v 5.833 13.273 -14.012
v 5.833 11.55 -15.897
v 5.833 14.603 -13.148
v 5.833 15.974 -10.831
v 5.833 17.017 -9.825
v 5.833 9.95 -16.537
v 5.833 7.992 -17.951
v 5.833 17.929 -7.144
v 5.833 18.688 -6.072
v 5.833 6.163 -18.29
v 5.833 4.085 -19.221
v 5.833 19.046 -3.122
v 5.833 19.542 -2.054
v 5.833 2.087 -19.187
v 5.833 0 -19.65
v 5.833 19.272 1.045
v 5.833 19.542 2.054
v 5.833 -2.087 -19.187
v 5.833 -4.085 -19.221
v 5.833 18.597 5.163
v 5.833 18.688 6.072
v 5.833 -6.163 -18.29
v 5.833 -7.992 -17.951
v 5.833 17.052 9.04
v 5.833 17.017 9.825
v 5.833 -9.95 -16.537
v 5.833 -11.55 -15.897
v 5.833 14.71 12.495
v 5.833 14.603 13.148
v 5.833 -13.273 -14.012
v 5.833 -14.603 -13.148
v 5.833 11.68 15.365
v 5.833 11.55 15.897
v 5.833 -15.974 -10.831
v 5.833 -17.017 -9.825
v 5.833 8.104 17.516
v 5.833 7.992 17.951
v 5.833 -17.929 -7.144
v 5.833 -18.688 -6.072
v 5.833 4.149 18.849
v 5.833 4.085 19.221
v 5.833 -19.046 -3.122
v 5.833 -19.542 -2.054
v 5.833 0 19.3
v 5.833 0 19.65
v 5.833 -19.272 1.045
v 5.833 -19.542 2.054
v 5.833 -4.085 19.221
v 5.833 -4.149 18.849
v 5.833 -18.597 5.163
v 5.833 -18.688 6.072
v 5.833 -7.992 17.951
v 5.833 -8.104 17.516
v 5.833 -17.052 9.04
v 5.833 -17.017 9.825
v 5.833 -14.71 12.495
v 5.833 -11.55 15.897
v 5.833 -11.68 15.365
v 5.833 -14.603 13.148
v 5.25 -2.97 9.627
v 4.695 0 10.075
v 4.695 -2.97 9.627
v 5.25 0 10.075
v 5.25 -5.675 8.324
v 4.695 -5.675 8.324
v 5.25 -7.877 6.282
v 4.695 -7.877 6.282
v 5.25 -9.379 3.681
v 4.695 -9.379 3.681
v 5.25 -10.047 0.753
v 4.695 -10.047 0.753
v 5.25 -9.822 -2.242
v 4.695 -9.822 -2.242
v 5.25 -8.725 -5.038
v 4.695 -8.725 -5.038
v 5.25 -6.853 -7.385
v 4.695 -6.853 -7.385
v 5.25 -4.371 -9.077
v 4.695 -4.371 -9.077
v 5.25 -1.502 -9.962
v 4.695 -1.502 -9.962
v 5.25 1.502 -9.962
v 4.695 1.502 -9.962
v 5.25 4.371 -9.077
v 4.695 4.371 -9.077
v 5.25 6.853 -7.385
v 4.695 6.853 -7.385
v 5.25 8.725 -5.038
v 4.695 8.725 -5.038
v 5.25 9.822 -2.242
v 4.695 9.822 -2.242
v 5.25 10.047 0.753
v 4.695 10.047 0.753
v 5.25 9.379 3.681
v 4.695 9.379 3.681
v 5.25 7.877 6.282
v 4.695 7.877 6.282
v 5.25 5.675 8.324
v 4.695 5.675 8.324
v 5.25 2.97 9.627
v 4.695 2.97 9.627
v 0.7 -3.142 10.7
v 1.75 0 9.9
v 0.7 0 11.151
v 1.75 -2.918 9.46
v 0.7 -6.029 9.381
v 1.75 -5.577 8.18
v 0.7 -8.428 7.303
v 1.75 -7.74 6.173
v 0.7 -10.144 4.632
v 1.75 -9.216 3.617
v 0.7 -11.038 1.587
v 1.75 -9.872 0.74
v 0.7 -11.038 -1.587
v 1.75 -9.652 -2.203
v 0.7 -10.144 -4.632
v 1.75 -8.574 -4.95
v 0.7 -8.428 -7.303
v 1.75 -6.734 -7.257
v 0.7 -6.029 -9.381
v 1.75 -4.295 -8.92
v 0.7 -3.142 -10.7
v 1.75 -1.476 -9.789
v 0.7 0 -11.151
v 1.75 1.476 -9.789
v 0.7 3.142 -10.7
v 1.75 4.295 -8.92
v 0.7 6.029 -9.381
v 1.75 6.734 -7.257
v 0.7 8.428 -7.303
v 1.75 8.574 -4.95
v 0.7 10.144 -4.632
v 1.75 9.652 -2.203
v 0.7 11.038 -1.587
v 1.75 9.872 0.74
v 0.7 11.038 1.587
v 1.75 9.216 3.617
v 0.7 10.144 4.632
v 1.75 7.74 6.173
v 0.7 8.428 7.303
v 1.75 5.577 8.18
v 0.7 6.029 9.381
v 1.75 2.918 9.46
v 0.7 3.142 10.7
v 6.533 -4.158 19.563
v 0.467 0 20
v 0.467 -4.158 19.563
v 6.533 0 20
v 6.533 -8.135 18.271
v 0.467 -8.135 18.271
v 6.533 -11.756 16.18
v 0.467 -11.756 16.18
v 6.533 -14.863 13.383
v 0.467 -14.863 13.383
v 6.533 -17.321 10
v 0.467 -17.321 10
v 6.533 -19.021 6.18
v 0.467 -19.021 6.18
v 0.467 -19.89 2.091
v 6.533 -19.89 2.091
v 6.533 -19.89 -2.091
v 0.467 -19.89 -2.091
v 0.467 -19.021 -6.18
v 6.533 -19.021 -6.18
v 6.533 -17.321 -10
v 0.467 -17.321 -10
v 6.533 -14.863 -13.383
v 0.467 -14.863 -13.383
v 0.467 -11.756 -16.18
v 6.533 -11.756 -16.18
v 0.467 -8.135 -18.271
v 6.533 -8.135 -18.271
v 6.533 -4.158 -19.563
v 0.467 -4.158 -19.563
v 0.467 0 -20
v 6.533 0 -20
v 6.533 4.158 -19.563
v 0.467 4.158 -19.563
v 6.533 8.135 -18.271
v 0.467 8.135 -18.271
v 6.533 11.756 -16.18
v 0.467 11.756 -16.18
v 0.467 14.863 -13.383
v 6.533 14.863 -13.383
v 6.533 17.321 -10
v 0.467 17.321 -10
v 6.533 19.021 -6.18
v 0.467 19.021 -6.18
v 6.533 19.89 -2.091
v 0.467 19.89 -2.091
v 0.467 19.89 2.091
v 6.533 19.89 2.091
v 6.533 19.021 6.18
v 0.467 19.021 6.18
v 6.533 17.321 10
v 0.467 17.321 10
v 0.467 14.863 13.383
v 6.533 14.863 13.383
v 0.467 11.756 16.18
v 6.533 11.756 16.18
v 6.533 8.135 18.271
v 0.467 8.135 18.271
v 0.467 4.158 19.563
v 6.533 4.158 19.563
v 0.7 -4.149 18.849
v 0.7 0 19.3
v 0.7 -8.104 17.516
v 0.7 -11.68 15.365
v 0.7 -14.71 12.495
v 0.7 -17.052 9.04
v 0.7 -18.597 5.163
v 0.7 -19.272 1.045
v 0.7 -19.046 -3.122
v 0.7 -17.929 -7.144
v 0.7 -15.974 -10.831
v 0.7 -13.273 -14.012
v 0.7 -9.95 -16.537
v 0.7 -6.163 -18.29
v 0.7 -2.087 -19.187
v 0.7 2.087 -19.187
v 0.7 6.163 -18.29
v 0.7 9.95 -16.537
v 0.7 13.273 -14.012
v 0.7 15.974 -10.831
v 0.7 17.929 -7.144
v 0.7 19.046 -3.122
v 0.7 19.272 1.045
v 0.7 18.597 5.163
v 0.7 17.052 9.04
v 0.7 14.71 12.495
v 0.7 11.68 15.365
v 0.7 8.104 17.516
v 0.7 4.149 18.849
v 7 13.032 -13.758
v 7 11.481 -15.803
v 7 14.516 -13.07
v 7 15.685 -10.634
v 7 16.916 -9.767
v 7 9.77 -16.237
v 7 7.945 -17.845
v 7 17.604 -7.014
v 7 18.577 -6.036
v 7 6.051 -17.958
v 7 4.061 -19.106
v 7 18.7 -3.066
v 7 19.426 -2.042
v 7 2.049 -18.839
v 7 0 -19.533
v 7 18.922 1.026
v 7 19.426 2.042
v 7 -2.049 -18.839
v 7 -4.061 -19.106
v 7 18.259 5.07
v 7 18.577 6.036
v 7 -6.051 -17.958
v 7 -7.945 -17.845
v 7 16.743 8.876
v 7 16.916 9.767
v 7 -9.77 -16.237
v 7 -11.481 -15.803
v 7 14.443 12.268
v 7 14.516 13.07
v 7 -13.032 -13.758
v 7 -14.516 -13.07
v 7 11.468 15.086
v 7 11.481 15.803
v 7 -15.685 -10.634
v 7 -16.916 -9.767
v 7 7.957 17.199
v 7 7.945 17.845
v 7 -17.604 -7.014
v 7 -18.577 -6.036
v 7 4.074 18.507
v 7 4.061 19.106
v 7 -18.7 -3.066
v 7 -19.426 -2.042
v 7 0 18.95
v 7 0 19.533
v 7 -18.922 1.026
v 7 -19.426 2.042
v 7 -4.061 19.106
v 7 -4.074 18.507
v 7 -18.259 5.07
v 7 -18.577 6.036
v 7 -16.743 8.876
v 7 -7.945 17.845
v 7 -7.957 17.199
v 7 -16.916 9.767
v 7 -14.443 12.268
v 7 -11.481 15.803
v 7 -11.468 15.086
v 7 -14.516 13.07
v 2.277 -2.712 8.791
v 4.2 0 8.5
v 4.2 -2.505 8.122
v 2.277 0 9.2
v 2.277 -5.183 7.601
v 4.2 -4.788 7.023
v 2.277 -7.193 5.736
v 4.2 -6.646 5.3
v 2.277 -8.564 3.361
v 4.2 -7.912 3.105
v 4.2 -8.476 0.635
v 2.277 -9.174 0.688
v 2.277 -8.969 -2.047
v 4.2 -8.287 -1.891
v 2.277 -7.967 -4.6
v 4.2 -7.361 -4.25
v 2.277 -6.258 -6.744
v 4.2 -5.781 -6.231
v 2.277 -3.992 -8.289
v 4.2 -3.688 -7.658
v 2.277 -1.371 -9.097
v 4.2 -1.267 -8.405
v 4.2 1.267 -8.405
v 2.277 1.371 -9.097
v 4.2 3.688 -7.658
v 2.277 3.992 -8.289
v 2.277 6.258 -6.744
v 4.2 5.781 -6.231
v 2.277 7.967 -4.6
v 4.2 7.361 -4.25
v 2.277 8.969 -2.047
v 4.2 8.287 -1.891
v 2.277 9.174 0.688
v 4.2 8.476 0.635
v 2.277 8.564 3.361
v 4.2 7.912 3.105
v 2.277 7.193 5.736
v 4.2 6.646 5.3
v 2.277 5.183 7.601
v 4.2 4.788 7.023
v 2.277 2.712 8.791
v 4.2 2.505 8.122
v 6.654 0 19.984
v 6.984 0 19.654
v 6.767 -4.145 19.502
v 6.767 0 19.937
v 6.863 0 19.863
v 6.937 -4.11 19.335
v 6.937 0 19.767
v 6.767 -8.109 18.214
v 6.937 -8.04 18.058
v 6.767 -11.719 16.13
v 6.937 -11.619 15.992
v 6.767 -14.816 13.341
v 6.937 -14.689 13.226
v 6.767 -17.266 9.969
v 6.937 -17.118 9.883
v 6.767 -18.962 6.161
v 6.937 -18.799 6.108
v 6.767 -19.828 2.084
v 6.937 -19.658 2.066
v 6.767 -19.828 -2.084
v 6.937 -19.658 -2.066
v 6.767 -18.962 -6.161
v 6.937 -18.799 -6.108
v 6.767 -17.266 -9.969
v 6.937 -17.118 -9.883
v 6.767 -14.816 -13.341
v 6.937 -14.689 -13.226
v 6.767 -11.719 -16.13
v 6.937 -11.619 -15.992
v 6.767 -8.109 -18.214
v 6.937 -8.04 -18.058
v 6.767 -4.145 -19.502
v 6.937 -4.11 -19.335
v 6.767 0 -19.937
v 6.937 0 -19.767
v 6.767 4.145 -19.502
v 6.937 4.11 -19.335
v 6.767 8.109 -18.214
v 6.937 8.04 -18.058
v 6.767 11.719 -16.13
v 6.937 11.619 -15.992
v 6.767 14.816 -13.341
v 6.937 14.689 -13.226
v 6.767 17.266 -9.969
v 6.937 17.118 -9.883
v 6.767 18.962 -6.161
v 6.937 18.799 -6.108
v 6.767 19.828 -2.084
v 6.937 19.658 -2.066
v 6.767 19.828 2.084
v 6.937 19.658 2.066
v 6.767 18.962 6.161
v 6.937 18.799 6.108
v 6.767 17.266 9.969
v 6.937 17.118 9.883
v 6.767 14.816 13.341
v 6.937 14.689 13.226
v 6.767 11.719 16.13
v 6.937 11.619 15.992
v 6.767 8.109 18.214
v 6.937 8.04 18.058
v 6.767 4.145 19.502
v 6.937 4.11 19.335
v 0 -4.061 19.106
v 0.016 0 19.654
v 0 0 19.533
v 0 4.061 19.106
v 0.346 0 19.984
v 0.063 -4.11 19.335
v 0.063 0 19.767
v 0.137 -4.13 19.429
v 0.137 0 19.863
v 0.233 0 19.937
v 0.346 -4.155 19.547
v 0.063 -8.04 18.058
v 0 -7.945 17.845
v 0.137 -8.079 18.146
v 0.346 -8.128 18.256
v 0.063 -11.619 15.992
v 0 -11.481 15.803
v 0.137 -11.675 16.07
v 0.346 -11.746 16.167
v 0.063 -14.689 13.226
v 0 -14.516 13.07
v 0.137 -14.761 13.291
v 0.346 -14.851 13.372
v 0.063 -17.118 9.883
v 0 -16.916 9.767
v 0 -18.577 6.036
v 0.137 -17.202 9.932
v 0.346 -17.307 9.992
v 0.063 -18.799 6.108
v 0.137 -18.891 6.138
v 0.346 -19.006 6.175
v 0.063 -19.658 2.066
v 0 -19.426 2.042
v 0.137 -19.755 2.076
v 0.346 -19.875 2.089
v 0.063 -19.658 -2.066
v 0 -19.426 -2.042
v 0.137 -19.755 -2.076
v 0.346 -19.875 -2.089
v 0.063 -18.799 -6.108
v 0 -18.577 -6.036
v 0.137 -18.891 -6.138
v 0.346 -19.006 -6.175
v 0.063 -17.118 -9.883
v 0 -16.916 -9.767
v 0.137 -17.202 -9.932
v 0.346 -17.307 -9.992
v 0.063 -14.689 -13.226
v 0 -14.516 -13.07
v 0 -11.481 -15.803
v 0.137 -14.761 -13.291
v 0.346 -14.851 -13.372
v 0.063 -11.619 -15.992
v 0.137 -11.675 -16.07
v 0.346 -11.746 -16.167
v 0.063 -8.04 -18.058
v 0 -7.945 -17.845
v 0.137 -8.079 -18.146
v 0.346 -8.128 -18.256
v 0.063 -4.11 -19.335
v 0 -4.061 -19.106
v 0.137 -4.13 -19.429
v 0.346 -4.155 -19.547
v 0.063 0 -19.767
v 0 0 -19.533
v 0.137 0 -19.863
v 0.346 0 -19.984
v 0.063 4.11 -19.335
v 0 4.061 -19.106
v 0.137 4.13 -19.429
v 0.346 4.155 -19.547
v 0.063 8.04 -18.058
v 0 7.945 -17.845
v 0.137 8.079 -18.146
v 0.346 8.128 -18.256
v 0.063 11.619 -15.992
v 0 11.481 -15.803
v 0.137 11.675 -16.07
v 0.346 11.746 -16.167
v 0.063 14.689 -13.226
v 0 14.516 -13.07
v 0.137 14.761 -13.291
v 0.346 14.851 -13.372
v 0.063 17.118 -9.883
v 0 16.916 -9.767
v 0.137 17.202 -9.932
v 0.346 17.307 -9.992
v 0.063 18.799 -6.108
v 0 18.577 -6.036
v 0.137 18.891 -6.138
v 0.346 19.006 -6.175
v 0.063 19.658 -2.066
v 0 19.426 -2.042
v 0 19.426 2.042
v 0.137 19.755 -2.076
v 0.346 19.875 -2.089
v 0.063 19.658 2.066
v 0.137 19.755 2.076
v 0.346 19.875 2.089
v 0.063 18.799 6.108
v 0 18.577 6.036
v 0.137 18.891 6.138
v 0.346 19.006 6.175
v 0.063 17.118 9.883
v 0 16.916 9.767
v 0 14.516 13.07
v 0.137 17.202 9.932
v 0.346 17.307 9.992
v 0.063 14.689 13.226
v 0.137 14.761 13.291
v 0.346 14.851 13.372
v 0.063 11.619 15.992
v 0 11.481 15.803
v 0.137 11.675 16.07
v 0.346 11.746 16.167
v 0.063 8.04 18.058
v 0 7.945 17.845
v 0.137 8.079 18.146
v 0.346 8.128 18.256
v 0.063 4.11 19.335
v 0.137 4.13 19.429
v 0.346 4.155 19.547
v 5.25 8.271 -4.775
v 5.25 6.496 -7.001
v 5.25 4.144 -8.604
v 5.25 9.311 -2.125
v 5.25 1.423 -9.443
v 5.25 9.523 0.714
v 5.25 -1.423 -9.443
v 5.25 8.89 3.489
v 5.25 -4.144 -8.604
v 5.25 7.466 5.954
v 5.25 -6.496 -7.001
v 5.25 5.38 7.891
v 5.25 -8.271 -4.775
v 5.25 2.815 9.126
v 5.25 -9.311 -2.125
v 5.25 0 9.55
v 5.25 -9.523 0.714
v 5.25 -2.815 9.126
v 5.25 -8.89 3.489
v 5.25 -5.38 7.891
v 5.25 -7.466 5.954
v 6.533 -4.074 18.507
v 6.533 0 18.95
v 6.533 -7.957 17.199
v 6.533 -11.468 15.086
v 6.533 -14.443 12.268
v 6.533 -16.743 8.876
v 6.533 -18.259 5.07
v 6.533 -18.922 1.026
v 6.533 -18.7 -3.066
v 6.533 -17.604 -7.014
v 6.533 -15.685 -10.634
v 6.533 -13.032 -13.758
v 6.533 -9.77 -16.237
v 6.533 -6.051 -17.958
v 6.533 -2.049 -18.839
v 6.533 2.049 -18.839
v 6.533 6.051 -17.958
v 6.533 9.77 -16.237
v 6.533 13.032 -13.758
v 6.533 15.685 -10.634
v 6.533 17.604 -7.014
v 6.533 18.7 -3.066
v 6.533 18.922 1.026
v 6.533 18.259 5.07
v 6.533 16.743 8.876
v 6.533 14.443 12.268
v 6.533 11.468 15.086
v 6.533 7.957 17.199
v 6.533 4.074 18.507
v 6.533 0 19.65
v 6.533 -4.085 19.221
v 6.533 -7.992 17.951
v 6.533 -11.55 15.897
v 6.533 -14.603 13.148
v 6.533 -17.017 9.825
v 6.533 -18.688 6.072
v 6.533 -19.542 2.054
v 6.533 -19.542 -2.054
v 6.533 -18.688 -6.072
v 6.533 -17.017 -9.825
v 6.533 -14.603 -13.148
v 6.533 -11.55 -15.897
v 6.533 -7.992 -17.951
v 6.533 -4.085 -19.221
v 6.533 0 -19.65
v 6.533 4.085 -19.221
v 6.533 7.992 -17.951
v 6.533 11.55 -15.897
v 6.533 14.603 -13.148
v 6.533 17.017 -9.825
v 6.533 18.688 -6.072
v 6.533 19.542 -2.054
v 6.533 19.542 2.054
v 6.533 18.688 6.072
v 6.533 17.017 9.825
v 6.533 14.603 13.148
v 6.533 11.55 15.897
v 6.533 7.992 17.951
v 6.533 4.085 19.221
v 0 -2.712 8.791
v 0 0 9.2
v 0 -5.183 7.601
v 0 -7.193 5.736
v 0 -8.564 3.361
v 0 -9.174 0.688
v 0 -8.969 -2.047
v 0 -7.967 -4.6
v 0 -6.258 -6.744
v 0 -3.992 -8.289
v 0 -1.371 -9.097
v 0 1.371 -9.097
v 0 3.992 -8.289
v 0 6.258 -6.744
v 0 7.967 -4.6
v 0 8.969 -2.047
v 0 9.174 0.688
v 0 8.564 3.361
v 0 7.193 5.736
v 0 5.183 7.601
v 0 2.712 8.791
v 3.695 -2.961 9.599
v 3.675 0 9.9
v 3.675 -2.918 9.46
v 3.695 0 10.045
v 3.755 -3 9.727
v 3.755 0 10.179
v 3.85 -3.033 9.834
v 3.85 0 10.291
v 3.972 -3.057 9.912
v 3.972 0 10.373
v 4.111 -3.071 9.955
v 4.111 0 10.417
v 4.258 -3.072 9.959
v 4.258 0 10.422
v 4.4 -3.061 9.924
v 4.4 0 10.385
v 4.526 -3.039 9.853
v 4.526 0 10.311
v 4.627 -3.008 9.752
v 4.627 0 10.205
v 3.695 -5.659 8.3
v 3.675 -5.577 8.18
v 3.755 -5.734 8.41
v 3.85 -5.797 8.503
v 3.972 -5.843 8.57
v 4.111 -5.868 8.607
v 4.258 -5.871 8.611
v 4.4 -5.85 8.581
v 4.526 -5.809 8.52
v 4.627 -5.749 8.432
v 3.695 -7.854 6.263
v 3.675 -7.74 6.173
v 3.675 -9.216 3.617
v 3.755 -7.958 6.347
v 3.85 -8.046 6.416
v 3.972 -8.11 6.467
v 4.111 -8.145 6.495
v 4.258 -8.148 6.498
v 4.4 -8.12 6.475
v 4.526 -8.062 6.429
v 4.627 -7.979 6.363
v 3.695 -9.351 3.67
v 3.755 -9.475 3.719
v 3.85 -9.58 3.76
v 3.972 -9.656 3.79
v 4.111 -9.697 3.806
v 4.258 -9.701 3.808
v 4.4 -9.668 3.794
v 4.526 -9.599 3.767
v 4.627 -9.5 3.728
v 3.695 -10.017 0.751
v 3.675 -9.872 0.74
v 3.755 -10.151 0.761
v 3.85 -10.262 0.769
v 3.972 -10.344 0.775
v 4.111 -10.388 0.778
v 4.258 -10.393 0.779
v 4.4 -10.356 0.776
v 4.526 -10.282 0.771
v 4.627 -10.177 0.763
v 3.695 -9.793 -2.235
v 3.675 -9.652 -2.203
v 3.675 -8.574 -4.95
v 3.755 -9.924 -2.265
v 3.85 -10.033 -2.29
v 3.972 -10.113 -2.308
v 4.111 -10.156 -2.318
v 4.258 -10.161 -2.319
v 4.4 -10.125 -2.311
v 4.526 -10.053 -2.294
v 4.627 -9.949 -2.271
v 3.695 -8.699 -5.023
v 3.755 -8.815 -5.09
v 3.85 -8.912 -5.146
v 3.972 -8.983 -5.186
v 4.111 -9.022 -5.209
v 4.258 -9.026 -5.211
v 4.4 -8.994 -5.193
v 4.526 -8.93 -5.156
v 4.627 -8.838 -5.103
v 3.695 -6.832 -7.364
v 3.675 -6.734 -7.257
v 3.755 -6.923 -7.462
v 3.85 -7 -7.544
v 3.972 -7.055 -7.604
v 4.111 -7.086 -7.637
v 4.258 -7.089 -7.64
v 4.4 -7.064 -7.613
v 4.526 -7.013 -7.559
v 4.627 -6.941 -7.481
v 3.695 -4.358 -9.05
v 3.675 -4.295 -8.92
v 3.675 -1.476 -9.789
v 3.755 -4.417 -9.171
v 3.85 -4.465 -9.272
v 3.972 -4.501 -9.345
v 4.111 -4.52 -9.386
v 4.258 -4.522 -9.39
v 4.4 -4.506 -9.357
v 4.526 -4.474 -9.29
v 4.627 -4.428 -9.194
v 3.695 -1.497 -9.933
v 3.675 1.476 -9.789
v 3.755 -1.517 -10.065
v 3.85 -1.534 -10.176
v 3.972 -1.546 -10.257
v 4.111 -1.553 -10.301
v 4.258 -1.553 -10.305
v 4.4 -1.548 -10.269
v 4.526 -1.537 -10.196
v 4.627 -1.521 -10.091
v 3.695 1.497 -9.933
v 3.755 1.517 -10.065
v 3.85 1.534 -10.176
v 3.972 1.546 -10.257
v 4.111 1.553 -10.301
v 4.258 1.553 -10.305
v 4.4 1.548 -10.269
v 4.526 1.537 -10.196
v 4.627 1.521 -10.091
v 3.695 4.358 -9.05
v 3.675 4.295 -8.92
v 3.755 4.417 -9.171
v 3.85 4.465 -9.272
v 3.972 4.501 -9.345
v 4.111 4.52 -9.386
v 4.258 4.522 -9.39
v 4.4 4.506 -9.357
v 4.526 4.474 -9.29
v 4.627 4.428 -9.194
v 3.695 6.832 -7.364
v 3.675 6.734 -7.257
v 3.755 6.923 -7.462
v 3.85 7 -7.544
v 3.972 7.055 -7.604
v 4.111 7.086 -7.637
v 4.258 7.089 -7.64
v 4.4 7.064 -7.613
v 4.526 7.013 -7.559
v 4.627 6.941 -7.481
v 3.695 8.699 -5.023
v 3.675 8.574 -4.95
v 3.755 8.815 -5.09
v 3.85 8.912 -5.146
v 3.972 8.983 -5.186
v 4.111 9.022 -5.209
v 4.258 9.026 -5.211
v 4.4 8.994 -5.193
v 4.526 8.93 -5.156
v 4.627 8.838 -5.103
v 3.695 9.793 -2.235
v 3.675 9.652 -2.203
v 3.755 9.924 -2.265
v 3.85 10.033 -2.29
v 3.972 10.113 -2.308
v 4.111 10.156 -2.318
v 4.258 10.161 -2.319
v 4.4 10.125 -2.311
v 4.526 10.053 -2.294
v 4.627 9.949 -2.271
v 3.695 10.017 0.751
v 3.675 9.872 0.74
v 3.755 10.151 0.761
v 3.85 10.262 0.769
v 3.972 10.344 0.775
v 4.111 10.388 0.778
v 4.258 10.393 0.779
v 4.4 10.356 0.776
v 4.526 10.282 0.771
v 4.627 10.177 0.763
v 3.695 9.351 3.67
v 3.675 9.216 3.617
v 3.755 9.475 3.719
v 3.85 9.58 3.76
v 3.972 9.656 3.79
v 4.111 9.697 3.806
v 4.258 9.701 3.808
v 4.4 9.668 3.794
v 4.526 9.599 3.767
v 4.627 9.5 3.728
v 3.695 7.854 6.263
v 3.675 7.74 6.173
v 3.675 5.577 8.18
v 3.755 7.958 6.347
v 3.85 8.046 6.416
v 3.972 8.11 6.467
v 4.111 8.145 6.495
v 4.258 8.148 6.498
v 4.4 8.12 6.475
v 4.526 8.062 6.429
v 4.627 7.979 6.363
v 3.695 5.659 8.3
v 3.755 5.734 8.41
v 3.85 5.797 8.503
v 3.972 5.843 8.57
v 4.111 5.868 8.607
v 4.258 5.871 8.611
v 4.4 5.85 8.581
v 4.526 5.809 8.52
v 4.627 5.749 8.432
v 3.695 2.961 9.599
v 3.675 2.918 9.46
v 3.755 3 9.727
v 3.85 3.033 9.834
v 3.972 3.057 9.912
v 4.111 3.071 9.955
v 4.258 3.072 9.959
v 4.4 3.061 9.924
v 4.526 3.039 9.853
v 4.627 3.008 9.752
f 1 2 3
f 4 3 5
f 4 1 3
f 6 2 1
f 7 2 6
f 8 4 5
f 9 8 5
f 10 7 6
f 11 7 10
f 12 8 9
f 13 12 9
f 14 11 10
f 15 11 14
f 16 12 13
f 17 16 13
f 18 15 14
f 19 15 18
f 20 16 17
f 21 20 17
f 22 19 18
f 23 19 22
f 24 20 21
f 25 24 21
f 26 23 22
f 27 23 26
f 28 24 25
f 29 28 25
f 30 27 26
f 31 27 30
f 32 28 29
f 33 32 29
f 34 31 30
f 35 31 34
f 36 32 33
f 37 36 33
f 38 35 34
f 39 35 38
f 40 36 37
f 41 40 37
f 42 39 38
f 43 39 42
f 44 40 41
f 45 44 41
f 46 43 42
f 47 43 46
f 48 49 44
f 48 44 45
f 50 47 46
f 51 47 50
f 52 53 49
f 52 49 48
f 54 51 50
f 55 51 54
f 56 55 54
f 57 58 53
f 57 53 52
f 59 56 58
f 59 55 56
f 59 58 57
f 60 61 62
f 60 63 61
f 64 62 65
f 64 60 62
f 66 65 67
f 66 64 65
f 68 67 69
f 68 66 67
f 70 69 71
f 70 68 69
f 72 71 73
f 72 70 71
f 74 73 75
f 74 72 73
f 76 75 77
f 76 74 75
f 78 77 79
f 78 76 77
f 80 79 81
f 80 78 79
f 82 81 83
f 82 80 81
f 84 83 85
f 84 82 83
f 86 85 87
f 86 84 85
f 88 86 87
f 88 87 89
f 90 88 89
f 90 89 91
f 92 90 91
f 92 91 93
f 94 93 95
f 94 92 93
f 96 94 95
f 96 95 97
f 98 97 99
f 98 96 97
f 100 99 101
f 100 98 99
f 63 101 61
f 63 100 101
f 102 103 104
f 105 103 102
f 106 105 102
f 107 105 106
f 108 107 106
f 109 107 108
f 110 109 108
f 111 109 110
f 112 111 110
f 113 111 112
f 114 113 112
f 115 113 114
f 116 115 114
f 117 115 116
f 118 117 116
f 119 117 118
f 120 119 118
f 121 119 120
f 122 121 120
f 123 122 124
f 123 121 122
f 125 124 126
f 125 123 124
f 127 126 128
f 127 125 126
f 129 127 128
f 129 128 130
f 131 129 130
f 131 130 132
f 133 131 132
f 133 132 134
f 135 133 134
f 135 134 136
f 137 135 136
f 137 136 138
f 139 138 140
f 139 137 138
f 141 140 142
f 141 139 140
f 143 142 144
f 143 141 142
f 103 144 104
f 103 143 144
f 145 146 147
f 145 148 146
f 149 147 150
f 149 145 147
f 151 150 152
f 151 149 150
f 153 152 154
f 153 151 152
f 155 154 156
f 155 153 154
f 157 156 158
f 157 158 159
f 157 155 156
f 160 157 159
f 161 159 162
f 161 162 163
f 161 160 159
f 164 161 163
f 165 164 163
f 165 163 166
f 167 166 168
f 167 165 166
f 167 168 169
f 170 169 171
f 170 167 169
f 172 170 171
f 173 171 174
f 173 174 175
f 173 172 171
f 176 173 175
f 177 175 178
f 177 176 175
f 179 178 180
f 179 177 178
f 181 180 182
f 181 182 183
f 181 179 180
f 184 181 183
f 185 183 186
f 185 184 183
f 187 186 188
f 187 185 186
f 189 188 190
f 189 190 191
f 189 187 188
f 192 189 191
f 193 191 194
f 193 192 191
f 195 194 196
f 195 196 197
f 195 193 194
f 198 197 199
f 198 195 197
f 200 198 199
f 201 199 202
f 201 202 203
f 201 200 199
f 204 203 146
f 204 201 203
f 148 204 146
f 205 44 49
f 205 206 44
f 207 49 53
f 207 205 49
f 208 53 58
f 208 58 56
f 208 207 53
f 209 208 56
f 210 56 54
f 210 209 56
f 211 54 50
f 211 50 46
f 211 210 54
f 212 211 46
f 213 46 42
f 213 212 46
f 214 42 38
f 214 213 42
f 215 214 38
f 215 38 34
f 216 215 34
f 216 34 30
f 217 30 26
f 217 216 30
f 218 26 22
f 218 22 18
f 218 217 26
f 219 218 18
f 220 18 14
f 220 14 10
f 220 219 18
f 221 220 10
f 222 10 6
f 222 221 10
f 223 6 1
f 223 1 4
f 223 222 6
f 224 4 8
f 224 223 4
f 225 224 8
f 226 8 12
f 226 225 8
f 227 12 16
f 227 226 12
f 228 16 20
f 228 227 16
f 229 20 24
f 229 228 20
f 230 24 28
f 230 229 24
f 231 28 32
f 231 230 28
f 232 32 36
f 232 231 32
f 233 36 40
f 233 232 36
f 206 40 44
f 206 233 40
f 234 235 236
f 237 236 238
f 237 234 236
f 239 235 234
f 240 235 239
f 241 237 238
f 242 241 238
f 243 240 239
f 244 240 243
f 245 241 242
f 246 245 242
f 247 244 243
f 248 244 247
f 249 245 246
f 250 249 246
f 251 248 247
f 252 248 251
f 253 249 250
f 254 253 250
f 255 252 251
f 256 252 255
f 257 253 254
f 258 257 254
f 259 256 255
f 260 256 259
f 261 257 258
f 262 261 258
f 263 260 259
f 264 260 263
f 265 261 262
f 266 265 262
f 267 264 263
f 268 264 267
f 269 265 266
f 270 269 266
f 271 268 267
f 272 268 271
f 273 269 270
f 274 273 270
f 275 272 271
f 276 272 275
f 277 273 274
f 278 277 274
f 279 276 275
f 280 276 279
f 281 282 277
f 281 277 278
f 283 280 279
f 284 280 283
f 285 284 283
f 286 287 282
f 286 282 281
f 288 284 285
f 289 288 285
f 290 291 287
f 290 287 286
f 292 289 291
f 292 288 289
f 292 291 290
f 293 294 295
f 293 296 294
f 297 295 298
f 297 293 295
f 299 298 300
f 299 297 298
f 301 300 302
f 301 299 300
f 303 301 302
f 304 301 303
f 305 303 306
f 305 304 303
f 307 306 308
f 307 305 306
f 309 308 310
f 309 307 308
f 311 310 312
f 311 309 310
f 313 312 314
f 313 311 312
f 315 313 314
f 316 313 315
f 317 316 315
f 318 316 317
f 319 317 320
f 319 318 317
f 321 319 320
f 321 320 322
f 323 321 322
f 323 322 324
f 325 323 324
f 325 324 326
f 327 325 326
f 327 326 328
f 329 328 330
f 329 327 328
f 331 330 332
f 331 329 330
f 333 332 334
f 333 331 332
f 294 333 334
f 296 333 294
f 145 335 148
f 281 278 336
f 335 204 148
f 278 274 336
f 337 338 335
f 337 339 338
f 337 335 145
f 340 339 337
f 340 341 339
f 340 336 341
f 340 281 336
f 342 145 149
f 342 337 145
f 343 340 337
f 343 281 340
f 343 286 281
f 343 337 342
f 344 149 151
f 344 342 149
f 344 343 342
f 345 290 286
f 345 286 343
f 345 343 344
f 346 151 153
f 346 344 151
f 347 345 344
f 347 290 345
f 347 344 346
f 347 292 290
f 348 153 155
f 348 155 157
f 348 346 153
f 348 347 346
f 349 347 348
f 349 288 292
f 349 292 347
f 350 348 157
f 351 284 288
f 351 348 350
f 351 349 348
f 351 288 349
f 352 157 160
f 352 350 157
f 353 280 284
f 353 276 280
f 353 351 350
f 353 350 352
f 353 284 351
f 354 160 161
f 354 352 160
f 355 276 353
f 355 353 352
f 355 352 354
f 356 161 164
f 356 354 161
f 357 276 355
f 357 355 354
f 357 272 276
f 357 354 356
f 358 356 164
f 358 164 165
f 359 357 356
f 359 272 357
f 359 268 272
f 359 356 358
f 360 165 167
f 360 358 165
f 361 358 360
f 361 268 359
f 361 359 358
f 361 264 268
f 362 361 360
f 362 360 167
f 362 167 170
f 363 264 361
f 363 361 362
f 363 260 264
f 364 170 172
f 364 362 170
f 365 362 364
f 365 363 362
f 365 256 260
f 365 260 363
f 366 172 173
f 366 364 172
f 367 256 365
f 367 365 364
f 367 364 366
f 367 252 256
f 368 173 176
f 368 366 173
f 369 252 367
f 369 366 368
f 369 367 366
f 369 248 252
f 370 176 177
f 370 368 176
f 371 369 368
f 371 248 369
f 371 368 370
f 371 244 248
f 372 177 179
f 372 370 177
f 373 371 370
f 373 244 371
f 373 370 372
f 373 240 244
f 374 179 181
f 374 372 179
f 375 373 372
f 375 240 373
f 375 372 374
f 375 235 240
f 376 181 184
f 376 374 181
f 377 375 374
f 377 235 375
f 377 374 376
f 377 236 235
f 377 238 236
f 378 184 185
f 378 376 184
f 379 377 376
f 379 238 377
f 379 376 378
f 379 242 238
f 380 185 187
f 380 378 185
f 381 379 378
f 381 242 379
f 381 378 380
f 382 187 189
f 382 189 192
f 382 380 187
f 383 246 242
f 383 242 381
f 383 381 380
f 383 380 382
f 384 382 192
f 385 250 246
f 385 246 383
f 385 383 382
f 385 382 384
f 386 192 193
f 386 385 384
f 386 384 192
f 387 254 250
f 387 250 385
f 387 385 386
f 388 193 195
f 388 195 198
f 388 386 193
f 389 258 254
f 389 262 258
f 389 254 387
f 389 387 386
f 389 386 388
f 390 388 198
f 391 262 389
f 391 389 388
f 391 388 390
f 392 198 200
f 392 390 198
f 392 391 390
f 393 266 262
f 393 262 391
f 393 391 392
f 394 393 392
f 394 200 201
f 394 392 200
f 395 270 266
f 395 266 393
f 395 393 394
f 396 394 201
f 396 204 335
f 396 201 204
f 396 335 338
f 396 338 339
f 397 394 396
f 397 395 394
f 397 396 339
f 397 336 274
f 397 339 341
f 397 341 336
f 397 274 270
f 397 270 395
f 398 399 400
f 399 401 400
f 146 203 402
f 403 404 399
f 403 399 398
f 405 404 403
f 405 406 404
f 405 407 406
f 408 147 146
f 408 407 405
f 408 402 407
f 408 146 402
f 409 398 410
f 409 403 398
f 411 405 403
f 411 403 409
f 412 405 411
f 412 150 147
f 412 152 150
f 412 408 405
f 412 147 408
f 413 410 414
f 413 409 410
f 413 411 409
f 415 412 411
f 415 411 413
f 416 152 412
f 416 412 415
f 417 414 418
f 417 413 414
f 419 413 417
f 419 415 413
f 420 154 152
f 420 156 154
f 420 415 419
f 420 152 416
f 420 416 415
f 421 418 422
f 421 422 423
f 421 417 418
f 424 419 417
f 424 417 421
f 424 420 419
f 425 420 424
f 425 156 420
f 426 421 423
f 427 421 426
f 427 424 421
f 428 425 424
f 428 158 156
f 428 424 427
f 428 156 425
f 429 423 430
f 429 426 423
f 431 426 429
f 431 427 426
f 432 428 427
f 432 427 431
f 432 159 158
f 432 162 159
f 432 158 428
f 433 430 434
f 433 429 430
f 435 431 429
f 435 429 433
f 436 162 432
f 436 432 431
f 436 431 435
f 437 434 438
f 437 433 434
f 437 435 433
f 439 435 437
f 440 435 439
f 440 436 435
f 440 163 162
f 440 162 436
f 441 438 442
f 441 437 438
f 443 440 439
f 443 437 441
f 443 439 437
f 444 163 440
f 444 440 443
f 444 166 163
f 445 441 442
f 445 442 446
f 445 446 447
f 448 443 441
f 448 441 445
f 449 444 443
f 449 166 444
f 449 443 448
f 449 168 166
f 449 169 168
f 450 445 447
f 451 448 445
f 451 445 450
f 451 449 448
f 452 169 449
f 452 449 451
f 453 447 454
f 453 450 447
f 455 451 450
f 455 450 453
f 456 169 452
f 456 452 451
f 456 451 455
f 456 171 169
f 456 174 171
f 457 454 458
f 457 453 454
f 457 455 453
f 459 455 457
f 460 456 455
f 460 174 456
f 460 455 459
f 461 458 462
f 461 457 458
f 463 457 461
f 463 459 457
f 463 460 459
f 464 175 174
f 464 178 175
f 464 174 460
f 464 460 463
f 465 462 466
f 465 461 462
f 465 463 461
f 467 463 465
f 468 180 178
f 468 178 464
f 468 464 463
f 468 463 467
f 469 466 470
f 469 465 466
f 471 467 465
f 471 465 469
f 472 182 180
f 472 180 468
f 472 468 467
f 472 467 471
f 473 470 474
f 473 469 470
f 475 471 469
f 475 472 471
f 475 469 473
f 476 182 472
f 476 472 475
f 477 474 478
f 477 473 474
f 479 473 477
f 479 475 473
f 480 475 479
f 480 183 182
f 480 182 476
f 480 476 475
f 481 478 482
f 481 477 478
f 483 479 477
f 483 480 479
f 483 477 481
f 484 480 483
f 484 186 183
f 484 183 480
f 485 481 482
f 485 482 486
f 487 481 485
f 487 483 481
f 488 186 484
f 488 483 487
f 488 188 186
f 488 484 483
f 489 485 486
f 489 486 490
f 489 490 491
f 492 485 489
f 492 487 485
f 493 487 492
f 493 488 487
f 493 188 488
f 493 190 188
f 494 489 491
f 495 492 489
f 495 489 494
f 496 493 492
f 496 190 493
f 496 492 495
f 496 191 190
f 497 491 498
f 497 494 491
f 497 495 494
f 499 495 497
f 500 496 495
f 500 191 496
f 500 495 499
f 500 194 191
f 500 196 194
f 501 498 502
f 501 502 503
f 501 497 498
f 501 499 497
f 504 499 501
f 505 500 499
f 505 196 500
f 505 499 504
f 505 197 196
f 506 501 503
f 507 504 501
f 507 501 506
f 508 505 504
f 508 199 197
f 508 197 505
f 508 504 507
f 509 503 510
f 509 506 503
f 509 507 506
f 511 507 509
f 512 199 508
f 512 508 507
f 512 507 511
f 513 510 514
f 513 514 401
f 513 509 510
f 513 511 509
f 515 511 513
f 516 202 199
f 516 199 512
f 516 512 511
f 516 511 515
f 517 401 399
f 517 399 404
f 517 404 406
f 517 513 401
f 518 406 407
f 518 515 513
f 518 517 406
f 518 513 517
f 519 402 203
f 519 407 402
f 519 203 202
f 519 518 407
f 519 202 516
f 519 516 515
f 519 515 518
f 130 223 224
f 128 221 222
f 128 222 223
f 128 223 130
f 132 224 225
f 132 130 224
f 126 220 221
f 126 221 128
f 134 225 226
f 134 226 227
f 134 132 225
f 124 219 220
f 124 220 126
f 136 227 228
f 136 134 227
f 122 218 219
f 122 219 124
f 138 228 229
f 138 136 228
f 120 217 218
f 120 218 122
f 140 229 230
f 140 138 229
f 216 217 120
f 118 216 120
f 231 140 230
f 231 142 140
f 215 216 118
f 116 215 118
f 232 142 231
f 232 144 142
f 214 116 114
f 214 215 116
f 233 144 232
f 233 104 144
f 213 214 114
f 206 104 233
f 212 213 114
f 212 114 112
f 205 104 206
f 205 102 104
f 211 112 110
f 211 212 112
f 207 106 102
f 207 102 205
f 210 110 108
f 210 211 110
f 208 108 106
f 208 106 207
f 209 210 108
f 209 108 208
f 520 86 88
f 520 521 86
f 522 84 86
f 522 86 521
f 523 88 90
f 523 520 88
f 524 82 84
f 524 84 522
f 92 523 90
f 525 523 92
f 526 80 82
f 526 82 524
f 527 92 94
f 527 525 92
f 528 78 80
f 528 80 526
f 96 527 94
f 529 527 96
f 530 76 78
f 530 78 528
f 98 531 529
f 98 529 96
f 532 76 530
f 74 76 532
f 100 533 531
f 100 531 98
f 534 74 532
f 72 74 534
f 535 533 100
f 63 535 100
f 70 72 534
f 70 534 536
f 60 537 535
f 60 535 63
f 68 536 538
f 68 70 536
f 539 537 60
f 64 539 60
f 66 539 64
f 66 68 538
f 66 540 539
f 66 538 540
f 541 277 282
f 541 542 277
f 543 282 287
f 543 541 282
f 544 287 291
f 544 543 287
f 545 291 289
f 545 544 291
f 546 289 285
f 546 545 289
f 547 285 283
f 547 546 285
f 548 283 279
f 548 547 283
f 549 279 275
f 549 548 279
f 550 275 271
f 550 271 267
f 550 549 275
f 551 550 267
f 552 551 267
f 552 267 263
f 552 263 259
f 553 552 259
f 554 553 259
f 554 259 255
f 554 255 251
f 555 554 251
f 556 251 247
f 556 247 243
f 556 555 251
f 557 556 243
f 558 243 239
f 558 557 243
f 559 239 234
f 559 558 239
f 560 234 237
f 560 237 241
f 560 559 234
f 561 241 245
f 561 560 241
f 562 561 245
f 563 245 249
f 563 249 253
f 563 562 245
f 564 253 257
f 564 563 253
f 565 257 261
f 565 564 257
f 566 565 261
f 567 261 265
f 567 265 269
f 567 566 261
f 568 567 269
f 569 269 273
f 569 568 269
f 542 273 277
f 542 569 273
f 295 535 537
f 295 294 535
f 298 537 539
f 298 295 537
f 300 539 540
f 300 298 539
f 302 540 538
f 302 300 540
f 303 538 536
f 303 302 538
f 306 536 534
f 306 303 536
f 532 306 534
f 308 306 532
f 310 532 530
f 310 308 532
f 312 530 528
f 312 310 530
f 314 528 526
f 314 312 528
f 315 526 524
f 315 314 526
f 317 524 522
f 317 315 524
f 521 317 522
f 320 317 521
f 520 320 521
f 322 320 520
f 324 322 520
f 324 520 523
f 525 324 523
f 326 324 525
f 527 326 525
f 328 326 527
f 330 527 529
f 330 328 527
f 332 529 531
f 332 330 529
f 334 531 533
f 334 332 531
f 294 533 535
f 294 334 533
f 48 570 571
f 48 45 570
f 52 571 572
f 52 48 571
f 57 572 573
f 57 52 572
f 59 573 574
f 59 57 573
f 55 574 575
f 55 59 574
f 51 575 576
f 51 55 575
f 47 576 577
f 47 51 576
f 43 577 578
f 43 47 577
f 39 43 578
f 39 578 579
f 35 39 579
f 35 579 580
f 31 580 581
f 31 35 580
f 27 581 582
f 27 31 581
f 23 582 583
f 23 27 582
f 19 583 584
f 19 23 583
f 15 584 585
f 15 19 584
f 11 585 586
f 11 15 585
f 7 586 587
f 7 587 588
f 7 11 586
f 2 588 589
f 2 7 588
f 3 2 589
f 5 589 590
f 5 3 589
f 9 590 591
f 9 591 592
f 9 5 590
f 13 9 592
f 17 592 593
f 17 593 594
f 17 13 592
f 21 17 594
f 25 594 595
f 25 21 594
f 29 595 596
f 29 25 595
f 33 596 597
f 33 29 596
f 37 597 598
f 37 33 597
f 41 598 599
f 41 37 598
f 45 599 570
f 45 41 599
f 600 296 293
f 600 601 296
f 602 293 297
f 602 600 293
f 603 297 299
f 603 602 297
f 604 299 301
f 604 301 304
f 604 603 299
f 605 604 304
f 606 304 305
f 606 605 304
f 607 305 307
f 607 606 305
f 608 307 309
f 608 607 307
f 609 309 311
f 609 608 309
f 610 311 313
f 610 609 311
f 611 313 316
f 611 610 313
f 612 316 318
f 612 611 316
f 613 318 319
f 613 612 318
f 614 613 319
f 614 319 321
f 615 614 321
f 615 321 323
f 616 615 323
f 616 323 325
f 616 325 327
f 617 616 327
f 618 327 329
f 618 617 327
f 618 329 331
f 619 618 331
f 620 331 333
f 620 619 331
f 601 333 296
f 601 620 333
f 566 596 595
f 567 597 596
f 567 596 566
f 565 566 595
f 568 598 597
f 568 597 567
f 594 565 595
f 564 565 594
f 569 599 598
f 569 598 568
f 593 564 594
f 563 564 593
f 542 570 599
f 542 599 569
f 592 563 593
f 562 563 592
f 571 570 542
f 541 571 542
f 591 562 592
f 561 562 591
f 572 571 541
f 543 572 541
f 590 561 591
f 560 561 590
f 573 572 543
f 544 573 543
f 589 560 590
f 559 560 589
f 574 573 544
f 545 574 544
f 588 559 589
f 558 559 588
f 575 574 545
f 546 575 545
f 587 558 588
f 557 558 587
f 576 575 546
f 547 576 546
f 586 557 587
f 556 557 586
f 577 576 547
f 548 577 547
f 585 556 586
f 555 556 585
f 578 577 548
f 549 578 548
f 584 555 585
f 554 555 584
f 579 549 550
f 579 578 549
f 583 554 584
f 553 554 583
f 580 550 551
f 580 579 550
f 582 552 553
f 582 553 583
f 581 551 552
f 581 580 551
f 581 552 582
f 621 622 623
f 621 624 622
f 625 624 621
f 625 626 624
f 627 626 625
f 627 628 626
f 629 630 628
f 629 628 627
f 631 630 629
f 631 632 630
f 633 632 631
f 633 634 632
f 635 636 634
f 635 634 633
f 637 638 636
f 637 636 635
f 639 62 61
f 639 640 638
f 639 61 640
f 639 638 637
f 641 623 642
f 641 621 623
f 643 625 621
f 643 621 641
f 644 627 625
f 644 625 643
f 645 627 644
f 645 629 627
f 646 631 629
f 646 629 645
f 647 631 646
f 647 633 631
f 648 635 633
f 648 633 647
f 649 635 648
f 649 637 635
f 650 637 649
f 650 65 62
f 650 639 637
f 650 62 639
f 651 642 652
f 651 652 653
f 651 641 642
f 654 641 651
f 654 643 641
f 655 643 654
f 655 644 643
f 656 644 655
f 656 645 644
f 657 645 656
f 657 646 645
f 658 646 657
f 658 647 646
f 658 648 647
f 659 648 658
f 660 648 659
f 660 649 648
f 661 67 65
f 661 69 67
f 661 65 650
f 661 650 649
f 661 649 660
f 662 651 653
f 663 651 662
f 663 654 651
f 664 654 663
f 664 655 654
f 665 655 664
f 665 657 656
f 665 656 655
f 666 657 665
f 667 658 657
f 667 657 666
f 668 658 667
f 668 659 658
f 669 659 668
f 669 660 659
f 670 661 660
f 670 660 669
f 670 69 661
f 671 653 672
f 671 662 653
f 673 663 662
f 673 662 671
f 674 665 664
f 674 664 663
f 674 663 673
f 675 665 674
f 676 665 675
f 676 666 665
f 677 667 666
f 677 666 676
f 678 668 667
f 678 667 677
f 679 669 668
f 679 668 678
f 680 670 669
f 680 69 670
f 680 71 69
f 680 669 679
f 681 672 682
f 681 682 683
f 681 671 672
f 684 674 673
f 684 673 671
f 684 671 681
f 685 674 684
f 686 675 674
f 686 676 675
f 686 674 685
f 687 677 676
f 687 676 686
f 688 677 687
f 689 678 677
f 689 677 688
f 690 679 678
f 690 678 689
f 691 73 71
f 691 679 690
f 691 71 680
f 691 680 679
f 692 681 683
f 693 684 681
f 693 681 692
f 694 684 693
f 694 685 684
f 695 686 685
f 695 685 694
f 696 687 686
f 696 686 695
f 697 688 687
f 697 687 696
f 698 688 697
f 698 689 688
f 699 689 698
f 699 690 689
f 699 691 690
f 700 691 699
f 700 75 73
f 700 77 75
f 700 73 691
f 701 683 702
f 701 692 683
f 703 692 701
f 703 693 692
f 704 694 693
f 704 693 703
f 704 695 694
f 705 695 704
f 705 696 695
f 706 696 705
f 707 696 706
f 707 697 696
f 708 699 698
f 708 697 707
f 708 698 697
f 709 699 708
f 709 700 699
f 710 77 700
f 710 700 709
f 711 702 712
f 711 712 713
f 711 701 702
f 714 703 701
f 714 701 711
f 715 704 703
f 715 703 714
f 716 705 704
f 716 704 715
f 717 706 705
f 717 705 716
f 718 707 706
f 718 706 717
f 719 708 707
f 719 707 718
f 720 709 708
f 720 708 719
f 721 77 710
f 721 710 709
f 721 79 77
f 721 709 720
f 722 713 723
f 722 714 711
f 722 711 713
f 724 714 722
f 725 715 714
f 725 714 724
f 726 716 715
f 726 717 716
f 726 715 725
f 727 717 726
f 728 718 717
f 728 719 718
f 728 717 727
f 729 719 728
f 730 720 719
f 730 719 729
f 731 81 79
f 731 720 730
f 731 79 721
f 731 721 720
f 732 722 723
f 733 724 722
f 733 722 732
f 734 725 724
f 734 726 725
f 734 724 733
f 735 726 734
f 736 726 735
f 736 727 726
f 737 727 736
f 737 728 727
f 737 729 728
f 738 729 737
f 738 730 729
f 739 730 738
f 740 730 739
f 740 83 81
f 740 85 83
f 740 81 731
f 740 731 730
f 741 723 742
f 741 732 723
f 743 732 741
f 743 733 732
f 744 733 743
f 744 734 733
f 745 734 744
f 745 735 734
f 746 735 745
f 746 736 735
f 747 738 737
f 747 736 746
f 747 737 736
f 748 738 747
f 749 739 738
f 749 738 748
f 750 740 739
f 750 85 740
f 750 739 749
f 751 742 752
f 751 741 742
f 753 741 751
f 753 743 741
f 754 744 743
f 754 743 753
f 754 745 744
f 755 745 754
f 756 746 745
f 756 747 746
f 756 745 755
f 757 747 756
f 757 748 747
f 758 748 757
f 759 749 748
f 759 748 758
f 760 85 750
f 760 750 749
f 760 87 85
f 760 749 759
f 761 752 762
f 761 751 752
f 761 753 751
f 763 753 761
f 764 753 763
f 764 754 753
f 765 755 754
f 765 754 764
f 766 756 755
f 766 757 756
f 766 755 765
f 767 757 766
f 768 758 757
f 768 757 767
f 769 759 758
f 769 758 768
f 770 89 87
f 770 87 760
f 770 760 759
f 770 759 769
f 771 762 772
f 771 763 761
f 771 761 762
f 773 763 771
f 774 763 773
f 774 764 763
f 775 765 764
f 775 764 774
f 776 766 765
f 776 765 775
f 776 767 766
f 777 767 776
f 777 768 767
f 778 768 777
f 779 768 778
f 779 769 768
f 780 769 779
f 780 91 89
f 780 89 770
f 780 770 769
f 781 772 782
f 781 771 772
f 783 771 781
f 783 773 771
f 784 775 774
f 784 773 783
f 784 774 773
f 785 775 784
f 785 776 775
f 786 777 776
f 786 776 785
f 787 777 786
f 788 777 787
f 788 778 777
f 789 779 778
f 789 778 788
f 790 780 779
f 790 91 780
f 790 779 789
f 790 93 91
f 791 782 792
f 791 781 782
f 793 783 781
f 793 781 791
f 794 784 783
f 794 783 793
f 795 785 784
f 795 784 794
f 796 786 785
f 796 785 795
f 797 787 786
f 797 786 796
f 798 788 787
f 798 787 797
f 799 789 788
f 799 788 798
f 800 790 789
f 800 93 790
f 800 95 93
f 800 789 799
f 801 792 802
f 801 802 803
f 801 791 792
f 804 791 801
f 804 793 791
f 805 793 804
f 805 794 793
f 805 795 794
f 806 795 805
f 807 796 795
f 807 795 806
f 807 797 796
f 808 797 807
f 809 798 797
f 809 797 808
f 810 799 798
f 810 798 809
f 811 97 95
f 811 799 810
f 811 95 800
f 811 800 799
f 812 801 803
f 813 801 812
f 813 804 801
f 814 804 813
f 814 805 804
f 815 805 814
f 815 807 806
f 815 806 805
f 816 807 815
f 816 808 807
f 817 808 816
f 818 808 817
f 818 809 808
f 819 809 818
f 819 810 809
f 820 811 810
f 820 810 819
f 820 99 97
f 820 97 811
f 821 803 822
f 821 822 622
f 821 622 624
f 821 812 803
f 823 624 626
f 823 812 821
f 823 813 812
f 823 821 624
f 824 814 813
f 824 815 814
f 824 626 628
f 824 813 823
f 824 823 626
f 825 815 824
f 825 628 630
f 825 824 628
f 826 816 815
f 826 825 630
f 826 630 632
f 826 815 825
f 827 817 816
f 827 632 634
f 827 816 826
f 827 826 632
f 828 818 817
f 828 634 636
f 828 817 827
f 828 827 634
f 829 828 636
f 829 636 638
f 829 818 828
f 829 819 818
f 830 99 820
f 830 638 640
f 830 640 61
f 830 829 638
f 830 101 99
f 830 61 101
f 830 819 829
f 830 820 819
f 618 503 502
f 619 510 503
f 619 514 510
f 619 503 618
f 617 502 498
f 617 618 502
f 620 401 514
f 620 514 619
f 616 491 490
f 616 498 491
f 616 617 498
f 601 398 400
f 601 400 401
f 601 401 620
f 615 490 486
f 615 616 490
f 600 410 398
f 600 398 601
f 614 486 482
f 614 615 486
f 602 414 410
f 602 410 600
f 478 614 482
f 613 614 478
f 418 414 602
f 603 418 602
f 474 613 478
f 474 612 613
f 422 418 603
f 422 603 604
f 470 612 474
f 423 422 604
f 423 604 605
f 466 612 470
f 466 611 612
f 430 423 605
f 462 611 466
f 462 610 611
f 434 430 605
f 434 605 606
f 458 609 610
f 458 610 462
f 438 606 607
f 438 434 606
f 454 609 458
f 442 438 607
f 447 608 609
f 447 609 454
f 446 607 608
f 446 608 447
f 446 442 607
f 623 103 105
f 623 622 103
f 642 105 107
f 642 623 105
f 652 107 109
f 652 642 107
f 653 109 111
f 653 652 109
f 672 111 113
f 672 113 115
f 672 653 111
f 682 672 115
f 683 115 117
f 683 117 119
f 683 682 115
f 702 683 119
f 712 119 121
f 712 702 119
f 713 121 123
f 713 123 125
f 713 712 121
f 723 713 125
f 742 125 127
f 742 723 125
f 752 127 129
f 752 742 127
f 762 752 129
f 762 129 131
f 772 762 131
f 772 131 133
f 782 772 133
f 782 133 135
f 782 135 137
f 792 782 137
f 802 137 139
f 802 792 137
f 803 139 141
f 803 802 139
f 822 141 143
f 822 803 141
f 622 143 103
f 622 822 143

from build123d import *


with BuildPart() as part:
    # Esquisse1 → Base-Révolution (revolve)
    with BuildSketch(Plane(origin=(0, 0, 0), x_dir=(1, 0, 0), z_dir=(0, 1, 0)), mode=Mode.PRIVATE) as base_r_volution_sk:
        with BuildLine():
            Line((0, 9.2), (0, 19.533333333))
            ThreePointArc((0, 19.533333333), (0.136683502, 19.863316498), (0.466666667, 20))
            Line((0.466666667, 20), (6.533333333, 20))
            ThreePointArc((6.533333333, 20), (6.863316498, 19.863316498), (7, 19.533333333))
            Line((7, 19.533333333), (7, 18.95))
            Line((7, 18.95), (6.533333333, 18.95))
            Line((6.533333333, 18.95), (6.533333333, 19.65))
            Line((6.533333333, 19.65), (5.833333333, 19.65))
            Line((5.833333333, 19.65), (5.833333333, 19.3))
            Line((5.833333333, 19.3), (0.7, 19.3))
            Line((0.7, 19.3), (0.7, 11.151341272))
            Line((0.7, 11.151341272), (1.75, 9.9))
            Line((1.75, 9.9), (3.675, 9.9))
            ThreePointArc((3.675, 9.9), (4.111221461, 10.417439244), (4.694974747, 10.075))
            Line((4.694974747, 10.075), (5.25, 10.075))
            Line((5.25, 10.075), (5.25, 9.55))
            Line((5.25, 9.55), (4.2, 8.5))
            Line((4.2, 8.5), (2.276765806, 9.2))
            Line((2.276765806, 9.2), (0, 9.2))
        make_face()
    revolve(base_r_volution_sk.sketch.rotate(Axis((0, 0, 0), (1, 0, 0)), 180), axis=Axis((0, 0, 0), (1, 0, 0)))


solid = part.part
